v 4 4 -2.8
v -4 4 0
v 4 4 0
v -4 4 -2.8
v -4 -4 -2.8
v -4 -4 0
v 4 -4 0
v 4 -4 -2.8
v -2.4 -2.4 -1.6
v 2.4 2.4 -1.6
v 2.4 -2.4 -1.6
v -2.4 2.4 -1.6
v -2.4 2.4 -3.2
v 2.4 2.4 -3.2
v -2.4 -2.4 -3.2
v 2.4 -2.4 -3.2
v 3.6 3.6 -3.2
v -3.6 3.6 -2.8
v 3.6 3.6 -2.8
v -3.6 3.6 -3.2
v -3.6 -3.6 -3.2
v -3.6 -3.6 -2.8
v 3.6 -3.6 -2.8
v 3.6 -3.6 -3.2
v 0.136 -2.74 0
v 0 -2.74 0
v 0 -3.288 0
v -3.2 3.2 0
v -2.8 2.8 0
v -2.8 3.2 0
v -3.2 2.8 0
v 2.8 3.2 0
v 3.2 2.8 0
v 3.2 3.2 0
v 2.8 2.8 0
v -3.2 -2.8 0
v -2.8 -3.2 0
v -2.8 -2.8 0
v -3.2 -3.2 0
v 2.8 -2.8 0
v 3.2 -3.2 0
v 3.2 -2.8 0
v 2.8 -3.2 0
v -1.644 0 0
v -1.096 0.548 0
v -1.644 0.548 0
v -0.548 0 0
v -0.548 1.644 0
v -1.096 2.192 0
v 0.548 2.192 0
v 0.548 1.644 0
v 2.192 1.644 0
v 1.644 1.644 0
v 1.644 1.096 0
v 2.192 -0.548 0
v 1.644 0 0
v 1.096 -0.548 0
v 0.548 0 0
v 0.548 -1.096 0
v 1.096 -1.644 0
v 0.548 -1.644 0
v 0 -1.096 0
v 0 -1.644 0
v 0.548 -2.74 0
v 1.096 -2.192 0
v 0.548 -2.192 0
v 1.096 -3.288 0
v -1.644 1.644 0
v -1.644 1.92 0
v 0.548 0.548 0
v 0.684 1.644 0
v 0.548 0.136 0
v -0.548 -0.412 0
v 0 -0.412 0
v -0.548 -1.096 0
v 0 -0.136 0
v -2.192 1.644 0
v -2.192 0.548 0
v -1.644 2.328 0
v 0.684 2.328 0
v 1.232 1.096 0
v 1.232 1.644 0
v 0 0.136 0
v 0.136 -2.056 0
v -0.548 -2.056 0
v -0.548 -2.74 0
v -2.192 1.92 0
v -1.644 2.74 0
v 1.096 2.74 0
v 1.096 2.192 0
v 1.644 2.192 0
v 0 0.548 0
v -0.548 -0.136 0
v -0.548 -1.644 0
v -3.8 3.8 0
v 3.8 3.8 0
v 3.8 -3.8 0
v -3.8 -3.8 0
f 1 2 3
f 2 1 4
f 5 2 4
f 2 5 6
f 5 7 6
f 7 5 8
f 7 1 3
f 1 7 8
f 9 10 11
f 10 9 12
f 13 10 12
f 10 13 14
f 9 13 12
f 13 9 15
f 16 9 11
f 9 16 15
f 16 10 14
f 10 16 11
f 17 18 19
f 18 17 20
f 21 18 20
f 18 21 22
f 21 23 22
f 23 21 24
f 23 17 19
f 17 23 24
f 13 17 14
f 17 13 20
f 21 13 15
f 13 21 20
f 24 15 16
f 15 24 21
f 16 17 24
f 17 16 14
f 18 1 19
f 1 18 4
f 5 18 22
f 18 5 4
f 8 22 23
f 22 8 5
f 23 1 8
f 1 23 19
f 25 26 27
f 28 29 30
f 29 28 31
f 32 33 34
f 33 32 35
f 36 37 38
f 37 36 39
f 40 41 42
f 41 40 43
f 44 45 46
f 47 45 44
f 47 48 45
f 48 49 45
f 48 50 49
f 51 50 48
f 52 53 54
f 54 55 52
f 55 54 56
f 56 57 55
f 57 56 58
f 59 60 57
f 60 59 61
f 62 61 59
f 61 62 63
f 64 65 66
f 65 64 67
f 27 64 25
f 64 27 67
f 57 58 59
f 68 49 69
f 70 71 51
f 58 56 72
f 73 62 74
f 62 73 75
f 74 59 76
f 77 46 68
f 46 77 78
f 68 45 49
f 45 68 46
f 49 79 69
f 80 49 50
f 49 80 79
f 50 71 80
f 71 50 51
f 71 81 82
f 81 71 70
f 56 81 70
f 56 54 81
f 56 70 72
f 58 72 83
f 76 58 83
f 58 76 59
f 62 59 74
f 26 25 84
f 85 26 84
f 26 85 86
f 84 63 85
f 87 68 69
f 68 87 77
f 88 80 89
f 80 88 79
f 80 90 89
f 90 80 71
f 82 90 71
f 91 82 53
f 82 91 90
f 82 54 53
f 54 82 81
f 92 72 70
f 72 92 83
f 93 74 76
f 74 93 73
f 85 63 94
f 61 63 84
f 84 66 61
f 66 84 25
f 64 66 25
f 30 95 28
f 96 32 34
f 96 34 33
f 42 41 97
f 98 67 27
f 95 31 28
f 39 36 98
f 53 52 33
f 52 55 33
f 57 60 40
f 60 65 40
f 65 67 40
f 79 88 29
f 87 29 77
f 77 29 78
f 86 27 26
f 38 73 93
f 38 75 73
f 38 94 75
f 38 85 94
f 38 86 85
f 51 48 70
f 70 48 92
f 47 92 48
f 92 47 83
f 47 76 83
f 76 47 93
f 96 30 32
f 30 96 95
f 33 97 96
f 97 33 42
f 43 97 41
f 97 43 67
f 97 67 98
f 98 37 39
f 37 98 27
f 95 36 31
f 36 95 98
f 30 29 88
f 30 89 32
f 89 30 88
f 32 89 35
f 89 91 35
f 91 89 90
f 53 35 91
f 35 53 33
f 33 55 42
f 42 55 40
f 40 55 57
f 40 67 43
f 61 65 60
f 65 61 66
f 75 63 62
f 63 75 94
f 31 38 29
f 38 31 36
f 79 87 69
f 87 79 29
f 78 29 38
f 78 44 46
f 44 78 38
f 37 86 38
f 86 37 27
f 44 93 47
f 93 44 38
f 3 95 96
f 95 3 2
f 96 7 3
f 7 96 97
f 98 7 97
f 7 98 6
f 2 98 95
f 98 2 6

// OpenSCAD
// file: ../p/box5.scad
use <../lib.scad>
function ldraw_lib__box5() = [
// 0 Box with 5 Faces and All Edges
// 0 Name: box5.dat
// 0 Author: James Jessiman
// 0 !LDRAW_ORG Primitive UPDATE 2012-01
// 0 !LICENSE Licensed under CC BY 4.0 : see CAreadme.txt
// 
// 0 BFC CERTIFY CCW
  [0,"BFC","CERTIFY"],
  [0,"BFC","CCW"],
// 
// 0 !HISTORY 2002-04-03 [sbliss] Modified for BFC compliance
// 0 !HISTORY 2002-04-25 [PTadmin] Official Update 2002-02
// 0 !HISTORY 2007-06-24 [PTadmin] Header formatted for Contributor Agreement
// 0 !HISTORY 2008-07-01 [PTadmin] Official Update 2008-01
// 0 !HISTORY 2012-02-16 [Philo] Changed to CCW
// 0 !HISTORY 2012-03-30 [PTadmin] Official Update 2012-01
// 
// 
// 2 24 1 1 1 -1 1 1
  [2,24,1,1,1,-1,1,1],
// 2 24 -1 1 1 -1 1 -1
  [2,24,-1,1,1,-1,1,-1],
// 2 24 -1 1 -1 1 1 -1
  [2,24,-1,1,-1,1,1,-1],
// 2 24 1 1 -1 1 1 1
  [2,24,1,1,-1,1,1,1],
// 2 24 1 0 1 -1 0 1
  [2,24,1,0,1,-1,0,1],
// 2 24 -1 0 1 -1 0 -1
  [2,24,-1,0,1,-1,0,-1],
// 2 24 -1 0 -1 1 0 -1
  [2,24,-1,0,-1,1,0,-1],
// 2 24 1 0 -1 1 0 1
  [2,24,1,0,-1,1,0,1],
// 2 24 1 0 1 1 1 1
  [2,24,1,0,1,1,1,1],
// 2 24 -1 0 1 -1 1 1
  [2,24,-1,0,1,-1,1,1],
// 2 24 1 0 -1 1 1 -1
  [2,24,1,0,-1,1,1,-1],
// 2 24 -1 0 -1 -1 1 -1
  [2,24,-1,0,-1,-1,1,-1],
// 4 16 -1 1 1 1 1 1 1 1 -1 -1 1 -1
  [4,16,-1,1,1,1,1,1,1,1,-1,-1,1,-1],
// 4 16 -1 1 1 -1 0 1 1 0 1 1 1 1
  [4,16,-1,1,1,-1,0,1,1,0,1,1,1,1],
// 4 16 -1 1 -1 -1 0 -1 -1 0 1 -1 1 1
  [4,16,-1,1,-1,-1,0,-1,-1,0,1,-1,1,1],
// 4 16 1 1 -1 1 0 -1 -1 0 -1 -1 1 -1
  [4,16,1,1,-1,1,0,-1,-1,0,-1,-1,1,-1],
// 4 16 1 1 1 1 0 1 1 0 -1 1 1 -1
  [4,16,1,1,1,1,0,1,1,0,-1,1,1,-1],
];
module ldraw_lib__box5(step=0, col=false, unit=2/5, alt=false, line=0.2, solid=!$preview)
    makepoly(ldraw_lib__box5(), step=step, col=col, unit=unit, alt=alt, line=line, solid=solid);
ldraw_lib__box5(line=0.2);
// file: ../p/box4.scad
use <../lib.scad>
function ldraw_lib__box4() = [
// 0 Box with 4 Faces (2 Parallel Pairs) and All Edges
// 0 Name: box4.dat
// 0 Author: James Jessiman
// 0 !LDRAW_ORG Primitive UPDATE 2012-01
// 0 !LICENSE Licensed under CC BY 4.0 : see CAreadme.txt
// 
// 0 BFC CERTIFY CCW
  [0,"BFC","CERTIFY"],
  [0,"BFC","CCW"],
// 
// 0 !HISTORY 2002-04-03 [sbliss] Modified for BFC compliance
// 0 !HISTORY 2002-04-25 [PTadmin] Official Update 2002-02
// 0 !HISTORY 2007-06-24 [PTadmin] Header formatted for Contributor Agreement
// 0 !HISTORY 2008-07-01 [PTadmin] Official Update 2008-01
// 0 !HISTORY 2012-02-16 [Philo] Changed to CCW
// 0 !HISTORY 2012-03-30 [PTadmin] Official Update 2012-01
// 
// 
// 2 24 1 1 1 -1 1 1
  [2,24,1,1,1,-1,1,1],
// 2 24 -1 1 1 -1 1 -1
  [2,24,-1,1,1,-1,1,-1],
// 2 24 -1 1 -1 1 1 -1
  [2,24,-1,1,-1,1,1,-1],
// 2 24 1 1 -1 1 1 1
  [2,24,1,1,-1,1,1,1],
// 2 24 1 0 1 -1 0 1
  [2,24,1,0,1,-1,0,1],
// 2 24 -1 0 1 -1 0 -1
  [2,24,-1,0,1,-1,0,-1],
// 2 24 -1 0 -1 1 0 -1
  [2,24,-1,0,-1,1,0,-1],
// 2 24 1 0 -1 1 0 1
  [2,24,1,0,-1,1,0,1],
// 2 24 1 0 1 1 1 1
  [2,24,1,0,1,1,1,1],
// 2 24 -1 0 1 -1 1 1
  [2,24,-1,0,1,-1,1,1],
// 2 24 1 0 -1 1 1 -1
  [2,24,1,0,-1,1,1,-1],
// 2 24 -1 0 -1 -1 1 -1
  [2,24,-1,0,-1,-1,1,-1],
// 4 16 -1 1 1 -1 0 1 1 0 1 1 1 1
  [4,16,-1,1,1,-1,0,1,1,0,1,1,1,1],
// 4 16 -1 1 -1 -1 0 -1 -1 0 1 -1 1 1
  [4,16,-1,1,-1,-1,0,-1,-1,0,1,-1,1,1],
// 4 16 1 1 -1 1 0 -1 -1 0 -1 -1 1 -1
  [4,16,1,1,-1,1,0,-1,-1,0,-1,-1,1,-1],
// 4 16 1 1 1 1 0 1 1 0 -1 1 1 -1
  [4,16,1,1,1,1,0,1,1,0,-1,1,1,-1],
];
module ldraw_lib__box4(step=0, col=false, unit=2/5, alt=false, line=0.2, solid=!$preview)
    makepoly(ldraw_lib__box4(), step=step, col=col, unit=unit, alt=alt, line=line, solid=solid);
ldraw_lib__box4(line=0.2);
// file: s/3070bs01.scad
use <../../lib.scad>
use <../../p/box4.scad>
use <../../p/box5.scad>
function ldraw_lib__s__3070bs01() = [
// 0 ~Tile  1 x  1 with Groove without Top Face
// 0 Name: s\3070bs01.dat
// 0 Author: Chris Dee [cwdee]
// 0 !LDRAW_ORG Subpart UPDATE 2009-02
// 0 !LICENSE Licensed under CC BY 4.0 : see CAreadme.txt
// 
// 0 BFC CERTIFY CCW
  [0,"BFC","CERTIFY"],
  [0,"BFC","CCW"],
// 
// 0 !HISTORY 2009-09-03 [PTadmin] Official Update 2009-02
// 
// 
// 1 16 0 0 0 10 0 0 0 7 0 0 0 10 box4.dat
  [1,16,0,0,0,10,0,0,0,7,0,0,0,10, ldraw_lib__box4()],
// 0 BFC INVERTNEXT
  [0,"BFC","INVERTNEXT"],
// 1 16 0 8 0 6 0 0 0 -4 0 0 0 6 box5.dat
  [1,16,0,8,0,6,0,0,0,-4,0,0,0,6, ldraw_lib__box5()],
// 1 16 0 7 0 9 0 0 0 1 0 0 0 9 box4.dat
  [1,16,0,7,0,9,0,0,0,1,0,0,0,9, ldraw_lib__box4()],
// 
// 4 16 9 8 9 6 8 6 -6 8 6 -9 8 9
  [4,16,9,8,9,6,8,6,-6,8,6,-9,8,9],
// 4 16 -9 8 9 -6 8 6 -6 8 -6 -9 8 -9
  [4,16,-9,8,9,-6,8,6,-6,8,-6,-9,8,-9],
// 4 16 -9 8 -9 -6 8 -6 6 8 -6 9 8 -9
  [4,16,-9,8,-9,-6,8,-6,6,8,-6,9,8,-9],
// 4 16 9 8 -9 6 8 -6 6 8 6 9 8 9
  [4,16,9,8,-9,6,8,-6,6,8,6,9,8,9],
// 
// 4 16 10 7 10 9 7 9 -9 7 9 -10 7 10
  [4,16,10,7,10,9,7,9,-9,7,9,-10,7,10],
// 4 16 -10 7 10 -9 7 9 -9 7 -9 -10 7 -10
  [4,16,-10,7,10,-9,7,9,-9,7,-9,-10,7,-10],
// 4 16 -10 7 -10 -9 7 -9 9 7 -9 10 7 -10
  [4,16,-10,7,-10,-9,7,-9,9,7,-9,10,7,-10],
// 4 16 10 7 -10 9 7 -9 9 7 9 10 7 10
  [4,16,10,7,-10,9,7,-9,9,7,9,10,7,10],
// 0
];
module ldraw_lib__s__3070bs01(step=0, col=false, unit=2/5, alt=false, line=0.2, solid=!$preview)
    makepoly(ldraw_lib__s__3070bs01(), step=step, col=col, unit=unit, alt=alt, line=line, solid=solid);
ldraw_lib__s__3070bs01(line=0.2);
// main file
use <../lib.scad>
use <s/3070bs01.scad>
function ldraw_lib__3070bp1l() = [
// 0 Tile  1 x  1 with Super Mario Pixelated Question Mark Block Pattern
// 0 Name: 3070bp1l.dat
// 0 Author: Florent Faramond [Makou]
// 0 !LDRAW_ORG Part UPDATE 2024-04
// 0 !LICENSE Licensed under CC BY 4.0 : see CAreadme.txt
// 
// 0 BFC CERTIFY CCW
  [0,"BFC","CERTIFY"],
  [0,"BFC","CCW"],
// 
// 0 !KEYWORDS Bricklink 3070bpb168, Brickowl 201220, Rebrickable 3070bpr0232
// 0 !KEYWORDS Set 71374
// 
// 0 !HISTORY 2024-04-29 [Holly-Wood] Merged vertices, adjusted color
// 0 !HISTORY 2024-05-28 [OrionP] Official Update 2024-04
// 
// 1 16 0 0 0 1 0 0 0 1 0 0 0 1 s\3070bs01.dat
  [1,16,0,0,0,1,0,0,0,1,0,0,0,1, ldraw_lib__s__3070bs01()],
// 
// 0 // Black
// 3 0 .34 0 -6.85 0 0 -6.85 0 0 -8.22
  [3,0,.34,0,-6.85,0,0,-6.85,0,0,-8.22],
// 4 0 -7 0 7 -7 0 8 -8 0 8 -8 0 7
  [4,0,-7,0,7,-7,0,8,-8,0,8,-8,0,7],
// 4 0 8 0 7 8 0 8 7 0 8 7 0 7
  [4,0,8,0,7,8,0,8,7,0,8,7,0,7],
// 4 0 -7 0 -8 -7 0 -7 -8 0 -7 -8 0 -8
  [4,0,-7,0,-8,-7,0,-7,-8,0,-7,-8,0,-8],
// 4 0 8 0 -8 8 0 -7 7 0 -7 7 0 -8
  [4,0,8,0,-8,8,0,-7,7,0,-7,7,0,-8],
// 3 0 -4.11 0 0 -2.74 0 1.37 -4.11 0 1.37
  [3,0,-4.11,0,0,-2.74,0,1.37,-4.11,0,1.37],
// 3 0 -1.37 0 0 -2.74 0 1.37 -4.11 0 0
  [3,0,-1.37,0,0,-2.74,0,1.37,-4.11,0,0],
// 3 0 -1.37 0 0 -1.37 0 4.11 -2.74 0 1.37
  [3,0,-1.37,0,0,-1.37,0,4.11,-2.74,0,1.37],
// 3 0 -1.37 0 4.11 -2.74 0 5.48 -2.74 0 1.37
  [3,0,-1.37,0,4.11,-2.74,0,5.48,-2.74,0,1.37],
// 3 0 -1.37 0 4.11 1.37 0 5.48 -2.74 0 5.48
  [3,0,-1.37,0,4.11,1.37,0,5.48,-2.74,0,5.48],
// 3 0 1.37 0 4.11 1.37 0 5.48 -1.37 0 4.11
  [3,0,1.37,0,4.11,1.37,0,5.48,-1.37,0,4.11],
// 3 0 5.48 0 4.11 4.11 0 4.11 4.11 0 2.74
  [3,0,5.48,0,4.11,4.11,0,4.11,4.11,0,2.74],
// 4 0 5.48 0 -1.37 5.48 0 4.11 4.11 0 2.74 4.11 0 0
  [4,0,5.48,0,-1.37,5.48,0,4.11,4.11,0,2.74,4.11,0,0],
// 4 0 1.37 0 0 2.74 0 -1.37 5.48 0 -1.37 4.11 0 0
  [4,0,1.37,0,0,2.74,0,-1.37,5.48,0,-1.37,4.11,0,0],
// 4 0 2.74 0 -4.11 2.74 0 -1.37 1.37 0 -2.74 1.37 0 -4.11
  [4,0,2.74,0,-4.11,2.74,0,-1.37,1.37,0,-2.74,1.37,0,-4.11],
// 4 0 1.37 0 -4.11 1.37 0 -2.74 0 0 -2.74 0 0 -4.11
  [4,0,1.37,0,-4.11,1.37,0,-2.74,0,0,-2.74,0,0,-4.11],
// 4 0 2.74 0 -8.22 2.74 0 -5.48 1.37 0 -5.48 1.37 0 -6.85
  [4,0,2.74,0,-8.22,2.74,0,-5.48,1.37,0,-5.48,1.37,0,-6.85],
// 4 0 2.74 0 -8.22 1.37 0 -6.85 .34 0 -6.85 0 0 -8.22
  [4,0,2.74,0,-8.22,1.37,0,-6.85,.34,0,-6.85,0,0,-8.22],
// 3 0 2.74 0 -1.37 1.37 0 0 1.37 0 -2.74
  [3,0,2.74,0,-1.37,1.37,0,0,1.37,0,-2.74],
// 
// 0 // Reddish Brown
// 3 70 -4.11 0 4.11 -2.74 0 5.48 -4.11 0 4.8
  [3,70,-4.11,0,4.11,-2.74,0,5.48,-4.11,0,4.8],
// 3 70 1.37 0 1.37 1.71 0 4.11 1.37 0 4.11
  [3,70,1.37,0,1.37,1.71,0,4.11,1.37,0,4.11],
// 3 70 1.37 0 0 4.11 0 0 1.37 0 .34
  [3,70,1.37,0,0,4.11,0,0,1.37,0,.34],
// 4 70 -1.37 0 -2.74 0 0 -2.74 0 0 -1.03 -1.37 0 -1.03
  [4,70,-1.37,0,-2.74,0,0,-2.74,0,0,-1.03,-1.37,0,-1.03],
// 3 70 0 0 -1.03 1.37 0 -2.74 0 0 -.34
  [3,70,0,0,-1.03,1.37,0,-2.74,0,0,-.34],
// 4 70 -4.11 0 1.37 -4.11 0 4.11 -5.48 0 4.11 -5.48 0 1.37
  [4,70,-4.11,0,1.37,-4.11,0,4.11,-5.48,0,4.11,-5.48,0,1.37],
// 4 70 -2.74 0 1.37 -2.74 0 5.48 -4.11 0 4.11 -4.11 0 1.37
  [4,70,-2.74,0,1.37,-2.74,0,5.48,-4.11,0,4.11,-4.11,0,1.37],
// 3 70 -2.74 0 5.48 -4.11 0 5.82 -4.11 0 4.8
  [3,70,-2.74,0,5.48,-4.11,0,5.82,-4.11,0,4.8],
// 4 70 1.37 0 5.48 1.71 0 5.82 -4.11 0 5.82 -2.74 0 5.48
  [4,70,1.37,0,5.48,1.71,0,5.82,-4.11,0,5.82,-2.74,0,5.48],
// 4 70 1.71 0 5.82 1.37 0 5.48 1.37 0 4.11 1.71 0 4.11
  [4,70,1.71,0,5.82,1.37,0,5.48,1.37,0,4.11,1.71,0,4.11],
// 4 70 3.08 0 2.74 3.08 0 4.11 1.71 0 4.11 1.37 0 1.37
  [4,70,3.08,0,2.74,3.08,0,4.11,1.71,0,4.11,1.37,0,1.37],
// 3 70 4.11 0 0 3.08 0 2.74 1.37 0 1.37
  [3,70,4.11,0,0,3.08,0,2.74,1.37,0,1.37],
// 3 70 4.11 0 0 4.11 0 2.74 3.08 0 2.74
  [3,70,4.11,0,0,4.11,0,2.74,3.08,0,2.74],
// 3 70 4.11 0 0 1.37 0 1.37 1.37 0 .34
  [3,70,4.11,0,0,1.37,0,1.37,1.37,0,.34],
// 3 70 1.37 0 0 1.37 0 .34 0 0 .34
  [3,70,1.37,0,0,1.37,0,.34,0,0,.34],
// 4 70 1.37 0 -2.74 1.37 0 0 0 0 .34 0 0 -.34
  [4,70,1.37,0,-2.74,1.37,0,0,0,0,.34,0,0,-.34],
// 3 70 0 0 -2.74 1.37 0 -2.74 0 0 -1.03
  [3,70,0,0,-2.74,1.37,0,-2.74,0,0,-1.03],
// 3 70 0 0 -6.85 .34 0 -6.85 .34 0 -5.14
  [3,70,0,0,-6.85,.34,0,-6.85,.34,0,-5.14],
// 4 70 -1.37 0 -6.85 0 0 -6.85 .34 0 -5.14 -1.37 0 -5.14
  [4,70,-1.37,0,-6.85,0,0,-6.85,.34,0,-5.14,-1.37,0,-5.14],
// 
// 0 // Dark Orange
// 3 484 .34 0 -5.14 0 0 -4.11 -1.37 0 -5.14
  [3,484,.34,0,-5.14,0,0,-4.11,-1.37,0,-5.14],
// 4 484 -4.11 0 4.11 -4.11 0 4.8 -5.48 0 4.8 -5.48 0 4.11
  [4,484,-4.11,0,4.11,-4.11,0,4.8,-5.48,0,4.8,-5.48,0,4.11],
// 4 484 1.71 0 5.82 2.74 0 6.85 -4.11 0 6.85 -4.11 0 5.82
  [4,484,1.71,0,5.82,2.74,0,6.85,-4.11,0,6.85,-4.11,0,5.82],
// 4 484 2.74 0 5.48 2.74 0 6.85 1.71 0 5.82 1.71 0 4.11
  [4,484,2.74,0,5.48,2.74,0,6.85,1.71,0,5.82,1.71,0,4.11],
// 3 484 3.08 0 4.11 2.74 0 5.48 1.71 0 4.11
  [3,484,3.08,0,4.11,2.74,0,5.48,1.71,0,4.11],
// 4 484 4.11 0 4.11 4.11 0 5.48 2.74 0 5.48 3.08 0 4.11
  [4,484,4.11,0,4.11,4.11,0,5.48,2.74,0,5.48,3.08,0,4.11],
// 4 484 4.11 0 2.74 4.11 0 4.11 3.08 0 4.11 3.08 0 2.74
  [4,484,4.11,0,2.74,4.11,0,4.11,3.08,0,4.11,3.08,0,2.74],
// 4 484 1.37 0 .34 1.37 0 1.37 0 0 1.37 0 0 .34
  [4,484,1.37,0,.34,1.37,0,1.37,0,0,1.37,0,0,.34],
// 4 484 0 0 -1.03 0 0 -.34 -1.37 0 -.34 -1.37 0 -1.03
  [4,484,0,0,-1.03,0,0,-.34,-1.37,0,-.34,-1.37,0,-1.03],
// 3 484 -1.37 0 -5.14 0 0 -4.11 -1.37 0 -4.11
  [3,484,-1.37,0,-5.14,0,0,-4.11,-1.37,0,-4.11],
// 3 484 1.37 0 -4.11 0 0 -4.11 .34 0 -5.14
  [3,484,1.37,0,-4.11,0,0,-4.11,.34,0,-5.14],
// 4 484 1.37 0 -5.48 1.37 0 -4.11 .34 0 -5.14 .34 0 -6.85
  [4,484,1.37,0,-5.48,1.37,0,-4.11,.34,0,-5.14,.34,0,-6.85],
// 3 484 1.37 0 -6.85 1.37 0 -5.48 .34 0 -6.85
  [3,484,1.37,0,-6.85,1.37,0,-5.48,.34,0,-6.85],
// 
// 0 // Mediaum Tan
// 3 371 -7 0 8 -9.5 0 9.5 -8 0 8
  [3,371,-7,0,8,-9.5,0,9.5,-8,0,8],
// 3 371 9.5 0 9.5 7 0 8 8 0 8
  [3,371,9.5,0,9.5,7,0,8,8,0,8],
// 3 371 9.5 0 9.5 8 0 8 8 0 7
  [3,371,9.5,0,9.5,8,0,8,8,0,7],
// 3 371 8 0 -7 8 0 -8 9.5 0 -9.5
  [3,371,8,0,-7,8,0,-8,9.5,0,-9.5],
// 3 371 -9.5 0 -9.5 2.74 0 -8.22 0 0 -8.22
  [3,371,-9.5,0,-9.5,2.74,0,-8.22,0,0,-8.22],
// 3 371 -9.5 0 9.5 -8 0 7 -8 0 8
  [3,371,-9.5,0,9.5,-8,0,7,-8,0,8],
// 3 371 -8 0 -8 -8 0 -7 -9.5 0 -9.5
  [3,371,-8,0,-8,-8,0,-7,-9.5,0,-9.5],
// 3 371 4.11 0 4.11 5.48 0 4.11 8 0 7
  [3,371,4.11,0,4.11,5.48,0,4.11,8,0,7],
// 3 371 5.48 0 4.11 5.48 0 -1.37 8 0 7
  [3,371,5.48,0,4.11,5.48,0,-1.37,8,0,7],
// 3 371 2.74 0 -1.37 2.74 0 -4.11 7 0 -7
  [3,371,2.74,0,-1.37,2.74,0,-4.11,7,0,-7],
// 3 371 2.74 0 -4.11 2.74 0 -5.48 7 0 -7
  [3,371,2.74,0,-4.11,2.74,0,-5.48,7,0,-7],
// 3 371 2.74 0 -5.48 2.74 0 -8.22 7 0 -7
  [3,371,2.74,0,-5.48,2.74,0,-8.22,7,0,-7],
// 3 371 -4.11 0 5.82 -4.11 0 6.85 -7 0 7
  [3,371,-4.11,0,5.82,-4.11,0,6.85,-7,0,7],
// 3 371 -5.48 0 4.8 -7 0 7 -5.48 0 4.11
  [3,371,-5.48,0,4.8,-7,0,7,-5.48,0,4.11],
// 3 371 -5.48 0 4.11 -7 0 7 -5.48 0 1.37
  [3,371,-5.48,0,4.11,-7,0,7,-5.48,0,1.37],
// 3 371 -1.37 0 -6.85 0 0 -8.22 0 0 -6.85
  [3,371,-1.37,0,-6.85,0,0,-8.22,0,0,-6.85],
// 3 371 -7 0 -7 -1.37 0 -1.03 -1.37 0 -.34
  [3,371,-7,0,-7,-1.37,0,-1.03,-1.37,0,-.34],
// 3 371 -7 0 -7 -1.37 0 -2.74 -1.37 0 -1.03
  [3,371,-7,0,-7,-1.37,0,-2.74,-1.37,0,-1.03],
// 3 371 -7 0 -7 -1.37 0 -4.11 -1.37 0 -2.74
  [3,371,-7,0,-7,-1.37,0,-4.11,-1.37,0,-2.74],
// 3 371 -7 0 -7 -1.37 0 -5.14 -1.37 0 -4.11
  [3,371,-7,0,-7,-1.37,0,-5.14,-1.37,0,-4.11],
// 3 371 -7 0 -7 -1.37 0 -6.85 -1.37 0 -5.14
  [3,371,-7,0,-7,-1.37,0,-6.85,-1.37,0,-5.14],
// 3 371 1.37 0 4.11 -1.37 0 4.11 1.37 0 1.37
  [3,371,1.37,0,4.11,-1.37,0,4.11,1.37,0,1.37],
// 3 371 1.37 0 1.37 -1.37 0 4.11 0 0 1.37
  [3,371,1.37,0,1.37,-1.37,0,4.11,0,0,1.37],
// 4 371 0 0 1.37 -1.37 0 4.11 -1.37 0 0 0 0 .34
  [4,371,0,0,1.37,-1.37,0,4.11,-1.37,0,0,0,0,.34],
// 4 371 0 0 -.34 0 0 .34 -1.37 0 0 -1.37 0 -.34
  [4,371,0,0,-.34,0,0,.34,-1.37,0,0,-1.37,0,-.34],
// 4 371 -9.5 0 9.5 -7 0 8 7 0 8 9.5 0 9.5
  [4,371,-9.5,0,9.5,-7,0,8,7,0,8,9.5,0,9.5],
// 4 371 9.5 0 9.5 8 0 7 8 0 -7 9.5 0 -9.5
  [4,371,9.5,0,9.5,8,0,7,8,0,-7,9.5,0,-9.5],
// 4 371 9.5 0 -9.5 8 0 -8 7 0 -8 2.74 0 -8.22
  [4,371,9.5,0,-9.5,8,0,-8,7,0,-8,2.74,0,-8.22],
// 3 371 9.5 0 -9.5 2.74 0 -8.22 -9.5 0 -9.5
  [3,371,9.5,0,-9.5,2.74,0,-8.22,-9.5,0,-9.5],
// 4 371 -9.5 0 -9.5 0 0 -8.22 -7 0 -8 -8 0 -8
  [4,371,-9.5,0,-9.5,0,0,-8.22,-7,0,-8,-8,0,-8],
// 4 371 -8 0 -7 -8 0 7 -9.5 0 9.5 -9.5 0 -9.5
  [4,371,-8,0,-7,-8,0,7,-9.5,0,9.5,-9.5,0,-9.5],
// 3 371 -7 0 8 -7 0 7 -4.11 0 6.85
  [3,371,-7,0,8,-7,0,7,-4.11,0,6.85],
// 4 371 -7 0 8 -4.11 0 6.85 2.74 0 6.85 7 0 8
  [4,371,-7,0,8,-4.11,0,6.85,2.74,0,6.85,7,0,8],
// 3 371 7 0 8 2.74 0 6.85 7 0 7
  [3,371,7,0,8,2.74,0,6.85,7,0,7],
// 4 371 7 0 7 2.74 0 6.85 2.74 0 5.48 4.11 0 5.48
  [4,371,7,0,7,2.74,0,6.85,2.74,0,5.48,4.11,0,5.48],
// 4 371 8 0 7 7 0 7 4.11 0 5.48 4.11 0 4.11
  [4,371,8,0,7,7,0,7,4.11,0,5.48,4.11,0,4.11],
// 3 371 8 0 7 5.48 0 -1.37 8 0 -7
  [3,371,8,0,7,5.48,0,-1.37,8,0,-7],
// 3 371 8 0 -7 5.48 0 -1.37 7 0 -7
  [3,371,8,0,-7,5.48,0,-1.37,7,0,-7],
// 3 371 7 0 -7 5.48 0 -1.37 2.74 0 -1.37
  [3,371,7,0,-7,5.48,0,-1.37,2.74,0,-1.37],
// 3 371 7 0 -7 2.74 0 -8.22 7 0 -8
  [3,371,7,0,-7,2.74,0,-8.22,7,0,-8],
// 4 371 1.37 0 -5.48 2.74 0 -5.48 2.74 0 -4.11 1.37 0 -4.11
  [4,371,1.37,0,-5.48,2.74,0,-5.48,2.74,0,-4.11,1.37,0,-4.11],
// 4 371 0 0 -4.11 0 0 -2.74 -1.37 0 -2.74 -1.37 0 -4.11
  [4,371,0,0,-4.11,0,0,-2.74,-1.37,0,-2.74,-1.37,0,-4.11],
// 4 371 -7 0 -7 -7 0 7 -8 0 7 -8 0 -7
  [4,371,-7,0,-7,-7,0,7,-8,0,7,-8,0,-7],
// 4 371 -4.11 0 4.8 -4.11 0 5.82 -7 0 7 -5.48 0 4.8
  [4,371,-4.11,0,4.8,-4.11,0,5.82,-7,0,7,-5.48,0,4.8],
// 3 371 -5.48 0 1.37 -7 0 7 -7 0 -7
  [3,371,-5.48,0,1.37,-7,0,7,-7,0,-7],
// 4 371 -4.11 0 1.37 -5.48 0 1.37 -7 0 -7 -4.11 0 0
  [4,371,-4.11,0,1.37,-5.48,0,1.37,-7,0,-7,-4.11,0,0],
// 4 371 -1.37 0 -6.85 -7 0 -7 -7 0 -8 0 0 -8.22
  [4,371,-1.37,0,-6.85,-7,0,-7,-7,0,-8,0,0,-8.22],
// 4 371 -1.37 0 0 -4.11 0 0 -7 0 -7 -1.37 0 -.34
  [4,371,-1.37,0,0,-4.11,0,0,-7,0,-7,-1.37,0,-.34],
// 
// 0 // Main Color
// 4 16 9.5 0 9.5 10 0 10 -10 0 10 -9.5 0 9.5
  [4,16,9.5,0,9.5,10,0,10,-10,0,10,-9.5,0,9.5],
// 4 16 10 0 10 9.5 0 9.5 9.5 0 -9.5 10 0 -10
  [4,16,10,0,10,9.5,0,9.5,9.5,0,-9.5,10,0,-10],
// 4 16 -9.5 0 -9.5 -10 0 -10 10 0 -10 9.5 0 -9.5
  [4,16,-9.5,0,-9.5,-10,0,-10,10,0,-10,9.5,0,-9.5],
// 4 16 -9.5 0 -9.5 -9.5 0 9.5 -10 0 10 -10 0 -10
  [4,16,-9.5,0,-9.5,-9.5,0,9.5,-10,0,10,-10,0,-10],
];
module ldraw_lib__3070bp1l(step=0, col=false, unit=2/5, alt=false, line=0.2, solid=!$preview)
    makepoly(ldraw_lib__3070bp1l(), step=step, col=col, unit=unit, alt=alt, line=line, solid=solid);
ldraw_lib__3070bp1l(line=0.2);
